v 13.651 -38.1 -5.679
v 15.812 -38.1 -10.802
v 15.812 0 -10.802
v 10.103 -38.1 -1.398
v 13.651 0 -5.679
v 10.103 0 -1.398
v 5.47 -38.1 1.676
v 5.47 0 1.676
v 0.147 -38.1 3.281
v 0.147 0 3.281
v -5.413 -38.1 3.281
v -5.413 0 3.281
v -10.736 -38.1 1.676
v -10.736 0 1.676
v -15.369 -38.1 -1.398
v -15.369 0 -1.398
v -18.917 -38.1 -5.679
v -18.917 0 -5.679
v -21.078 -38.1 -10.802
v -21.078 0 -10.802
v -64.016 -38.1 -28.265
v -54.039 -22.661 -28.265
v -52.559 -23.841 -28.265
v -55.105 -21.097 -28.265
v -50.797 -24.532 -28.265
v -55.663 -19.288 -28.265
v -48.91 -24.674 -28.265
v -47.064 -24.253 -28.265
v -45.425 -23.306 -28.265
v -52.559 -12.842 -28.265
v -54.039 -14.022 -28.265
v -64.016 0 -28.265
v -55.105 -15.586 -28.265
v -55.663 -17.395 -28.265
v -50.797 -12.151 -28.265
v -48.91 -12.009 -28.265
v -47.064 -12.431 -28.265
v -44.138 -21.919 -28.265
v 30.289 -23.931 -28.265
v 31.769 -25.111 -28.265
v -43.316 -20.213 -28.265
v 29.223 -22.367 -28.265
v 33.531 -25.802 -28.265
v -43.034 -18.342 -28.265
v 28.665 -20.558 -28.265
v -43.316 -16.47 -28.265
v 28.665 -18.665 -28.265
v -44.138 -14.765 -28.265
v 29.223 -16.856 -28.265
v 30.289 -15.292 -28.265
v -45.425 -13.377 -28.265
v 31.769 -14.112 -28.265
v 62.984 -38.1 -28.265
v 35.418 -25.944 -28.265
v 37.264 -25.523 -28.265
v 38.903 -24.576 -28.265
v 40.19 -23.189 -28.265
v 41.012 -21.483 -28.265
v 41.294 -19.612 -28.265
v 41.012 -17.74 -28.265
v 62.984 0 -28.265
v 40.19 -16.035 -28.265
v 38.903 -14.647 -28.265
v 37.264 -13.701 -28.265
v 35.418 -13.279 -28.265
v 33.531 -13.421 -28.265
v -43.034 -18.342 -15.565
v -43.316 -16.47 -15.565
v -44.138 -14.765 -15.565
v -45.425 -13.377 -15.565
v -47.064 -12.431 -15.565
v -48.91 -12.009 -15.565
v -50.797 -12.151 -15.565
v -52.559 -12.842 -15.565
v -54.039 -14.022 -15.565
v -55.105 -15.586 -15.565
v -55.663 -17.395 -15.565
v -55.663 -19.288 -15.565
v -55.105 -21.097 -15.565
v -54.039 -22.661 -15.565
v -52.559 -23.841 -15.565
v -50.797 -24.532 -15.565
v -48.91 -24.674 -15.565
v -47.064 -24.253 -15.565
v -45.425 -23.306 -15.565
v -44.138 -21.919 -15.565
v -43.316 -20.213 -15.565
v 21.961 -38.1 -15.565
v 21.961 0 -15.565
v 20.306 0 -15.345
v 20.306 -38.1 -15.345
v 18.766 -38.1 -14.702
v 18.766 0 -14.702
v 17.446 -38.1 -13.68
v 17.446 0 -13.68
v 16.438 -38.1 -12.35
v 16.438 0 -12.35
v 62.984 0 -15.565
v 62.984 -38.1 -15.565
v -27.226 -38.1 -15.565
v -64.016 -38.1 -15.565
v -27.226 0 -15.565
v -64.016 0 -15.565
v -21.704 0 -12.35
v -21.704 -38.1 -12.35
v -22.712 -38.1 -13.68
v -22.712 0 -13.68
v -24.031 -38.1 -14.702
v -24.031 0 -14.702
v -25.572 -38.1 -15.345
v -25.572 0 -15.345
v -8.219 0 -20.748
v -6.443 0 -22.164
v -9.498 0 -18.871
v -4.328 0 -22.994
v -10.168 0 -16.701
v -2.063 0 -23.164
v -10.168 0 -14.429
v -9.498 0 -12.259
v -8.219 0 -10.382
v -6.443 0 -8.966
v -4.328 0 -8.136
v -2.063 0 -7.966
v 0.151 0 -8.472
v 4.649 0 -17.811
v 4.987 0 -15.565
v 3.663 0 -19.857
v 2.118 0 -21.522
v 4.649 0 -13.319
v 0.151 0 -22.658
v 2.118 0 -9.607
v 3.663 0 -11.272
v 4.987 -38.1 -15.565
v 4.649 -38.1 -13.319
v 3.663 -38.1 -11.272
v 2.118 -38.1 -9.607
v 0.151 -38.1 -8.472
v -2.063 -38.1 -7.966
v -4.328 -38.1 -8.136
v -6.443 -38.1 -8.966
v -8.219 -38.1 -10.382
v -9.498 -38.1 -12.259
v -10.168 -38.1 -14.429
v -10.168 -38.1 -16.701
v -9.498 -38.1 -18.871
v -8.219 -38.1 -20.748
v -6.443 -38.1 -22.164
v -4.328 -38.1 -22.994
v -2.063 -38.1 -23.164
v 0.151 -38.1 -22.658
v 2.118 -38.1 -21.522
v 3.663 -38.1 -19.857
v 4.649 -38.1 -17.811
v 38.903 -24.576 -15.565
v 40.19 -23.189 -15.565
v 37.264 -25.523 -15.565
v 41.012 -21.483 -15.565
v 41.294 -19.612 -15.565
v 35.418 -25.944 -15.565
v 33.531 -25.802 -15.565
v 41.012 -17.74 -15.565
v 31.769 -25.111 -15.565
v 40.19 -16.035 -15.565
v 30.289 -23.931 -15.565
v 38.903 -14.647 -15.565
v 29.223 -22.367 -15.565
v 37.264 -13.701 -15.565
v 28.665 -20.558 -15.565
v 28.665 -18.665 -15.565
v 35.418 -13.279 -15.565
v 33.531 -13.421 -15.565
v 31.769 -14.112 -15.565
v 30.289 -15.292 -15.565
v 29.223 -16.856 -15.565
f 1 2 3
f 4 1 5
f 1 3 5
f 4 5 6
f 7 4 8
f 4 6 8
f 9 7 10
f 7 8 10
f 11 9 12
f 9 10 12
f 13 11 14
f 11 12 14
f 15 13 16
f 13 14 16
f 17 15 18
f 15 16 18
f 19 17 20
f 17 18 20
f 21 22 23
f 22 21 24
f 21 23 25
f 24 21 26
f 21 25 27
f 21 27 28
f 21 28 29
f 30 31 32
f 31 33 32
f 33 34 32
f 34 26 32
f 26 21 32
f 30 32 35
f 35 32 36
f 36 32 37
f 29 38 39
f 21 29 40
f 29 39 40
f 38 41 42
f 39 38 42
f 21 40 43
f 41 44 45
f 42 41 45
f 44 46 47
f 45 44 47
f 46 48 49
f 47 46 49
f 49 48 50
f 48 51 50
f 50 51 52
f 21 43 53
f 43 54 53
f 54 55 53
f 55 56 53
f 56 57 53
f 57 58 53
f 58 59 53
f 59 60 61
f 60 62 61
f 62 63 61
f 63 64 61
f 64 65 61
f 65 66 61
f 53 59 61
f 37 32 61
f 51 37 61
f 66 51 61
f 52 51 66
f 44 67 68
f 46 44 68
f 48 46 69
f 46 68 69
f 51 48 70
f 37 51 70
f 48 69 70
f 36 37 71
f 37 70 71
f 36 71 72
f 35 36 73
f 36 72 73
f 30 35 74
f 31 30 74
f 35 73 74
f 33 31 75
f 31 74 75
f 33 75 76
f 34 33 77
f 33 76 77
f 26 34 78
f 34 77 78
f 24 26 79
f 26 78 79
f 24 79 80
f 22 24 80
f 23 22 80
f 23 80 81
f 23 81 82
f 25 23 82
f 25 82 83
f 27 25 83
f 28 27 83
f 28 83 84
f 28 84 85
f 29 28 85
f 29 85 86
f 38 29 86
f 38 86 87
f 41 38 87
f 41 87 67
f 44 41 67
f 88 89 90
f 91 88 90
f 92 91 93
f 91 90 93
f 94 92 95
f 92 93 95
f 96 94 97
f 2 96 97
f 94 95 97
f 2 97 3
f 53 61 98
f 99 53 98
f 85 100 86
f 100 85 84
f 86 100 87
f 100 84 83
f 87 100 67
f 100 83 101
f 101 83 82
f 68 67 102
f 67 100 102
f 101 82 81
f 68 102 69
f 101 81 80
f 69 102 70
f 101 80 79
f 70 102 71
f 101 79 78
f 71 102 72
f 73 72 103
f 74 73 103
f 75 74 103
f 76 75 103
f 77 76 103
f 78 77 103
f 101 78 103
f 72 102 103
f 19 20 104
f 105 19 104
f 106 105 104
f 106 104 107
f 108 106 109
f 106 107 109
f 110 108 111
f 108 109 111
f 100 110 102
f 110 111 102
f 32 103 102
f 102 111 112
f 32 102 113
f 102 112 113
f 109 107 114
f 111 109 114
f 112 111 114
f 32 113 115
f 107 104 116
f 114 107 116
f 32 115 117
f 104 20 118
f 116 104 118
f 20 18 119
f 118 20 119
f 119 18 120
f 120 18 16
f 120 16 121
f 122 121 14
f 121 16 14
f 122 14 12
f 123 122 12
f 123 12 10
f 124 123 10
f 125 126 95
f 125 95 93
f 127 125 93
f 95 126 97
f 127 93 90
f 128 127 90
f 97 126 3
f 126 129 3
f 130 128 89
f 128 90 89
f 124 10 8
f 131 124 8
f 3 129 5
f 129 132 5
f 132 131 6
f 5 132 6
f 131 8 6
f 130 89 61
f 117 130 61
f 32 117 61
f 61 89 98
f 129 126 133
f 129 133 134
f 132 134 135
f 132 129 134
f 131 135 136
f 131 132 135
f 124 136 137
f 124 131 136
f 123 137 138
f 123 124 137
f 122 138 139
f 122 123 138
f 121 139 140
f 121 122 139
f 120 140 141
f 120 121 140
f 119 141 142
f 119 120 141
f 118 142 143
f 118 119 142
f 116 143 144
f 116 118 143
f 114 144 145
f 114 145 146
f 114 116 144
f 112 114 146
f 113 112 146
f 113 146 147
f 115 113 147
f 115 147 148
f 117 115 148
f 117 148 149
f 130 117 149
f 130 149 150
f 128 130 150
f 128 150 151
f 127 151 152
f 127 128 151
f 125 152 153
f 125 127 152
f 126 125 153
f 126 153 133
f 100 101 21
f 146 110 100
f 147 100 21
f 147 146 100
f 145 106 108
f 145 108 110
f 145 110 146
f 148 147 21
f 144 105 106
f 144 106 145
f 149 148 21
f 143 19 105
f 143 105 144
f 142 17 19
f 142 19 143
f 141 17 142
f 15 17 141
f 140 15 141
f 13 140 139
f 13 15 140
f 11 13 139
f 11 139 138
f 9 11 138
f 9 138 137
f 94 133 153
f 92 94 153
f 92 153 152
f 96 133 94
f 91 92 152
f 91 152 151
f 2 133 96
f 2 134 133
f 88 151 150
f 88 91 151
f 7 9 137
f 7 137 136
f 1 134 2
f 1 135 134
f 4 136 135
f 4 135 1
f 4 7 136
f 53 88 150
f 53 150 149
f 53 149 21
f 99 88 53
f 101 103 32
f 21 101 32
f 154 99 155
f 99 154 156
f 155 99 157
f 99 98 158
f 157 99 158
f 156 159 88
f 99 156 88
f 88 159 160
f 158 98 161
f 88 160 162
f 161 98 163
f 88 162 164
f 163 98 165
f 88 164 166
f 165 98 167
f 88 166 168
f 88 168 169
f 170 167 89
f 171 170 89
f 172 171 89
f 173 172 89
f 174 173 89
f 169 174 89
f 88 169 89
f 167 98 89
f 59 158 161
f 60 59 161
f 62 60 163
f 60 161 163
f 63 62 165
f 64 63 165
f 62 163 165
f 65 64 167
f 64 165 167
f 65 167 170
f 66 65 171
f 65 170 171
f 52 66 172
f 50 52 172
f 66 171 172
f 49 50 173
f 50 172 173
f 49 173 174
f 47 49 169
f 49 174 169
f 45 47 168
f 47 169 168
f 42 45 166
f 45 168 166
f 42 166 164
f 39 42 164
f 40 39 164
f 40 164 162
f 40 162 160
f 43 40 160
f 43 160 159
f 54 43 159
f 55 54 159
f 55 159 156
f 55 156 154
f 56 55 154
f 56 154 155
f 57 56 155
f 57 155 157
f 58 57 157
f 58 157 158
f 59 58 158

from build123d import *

# Parameters (mm, degrees)
F0_R     = 7.62
F1_DEPTH = 38.1
F2_R     = 6.35
F3_DEPTH = 25.4


with BuildPart() as f1:
    # F0 (on Front) → F1 (new body)
    with BuildSketch(Plane.XZ):
        with BuildLine():
            Line((-64.016195, -28.264835), (62.983805, -28.264835))
            Line((62.983805, -28.264835), (62.983805, -15.564835))
            Line((62.983805, -15.564835), (21.960583, -15.564835))
            ThreePointArc((21.960583, -15.564835), (18.072018, -14.23495), (15.812222, -10.802335))
            ThreePointArc((15.812222, -10.802335), (-2.632861, 3.485165), (-21.077944, -10.802335))
            ThreePointArc((-21.077944, -10.802335), (-23.33774, -14.23495), (-27.226305, -15.564835))
            Line((-27.226305, -15.564835), (-64.016195, -15.564835))
            Line((-64.016195, -15.564835), (-64.016195, -28.264835))
        make_face()
        with Locations((-2.632861, -15.564835)):
            Circle(F0_R, mode=Mode.SUBTRACT)
    extrude(amount=F1_DEPTH)

    # F2 (on face) → F3 (cut)
    with BuildSketch(Plane.XY.offset(-15.564835)):
        with Locations((-49.384239, -18.341588)):
            Circle(F2_R)
        with Locations((34.943767, -19.611587)):
            Circle(F2_R)
    extrude(amount=-F3_DEPTH, mode=Mode.SUBTRACT)


solid = f1.part
